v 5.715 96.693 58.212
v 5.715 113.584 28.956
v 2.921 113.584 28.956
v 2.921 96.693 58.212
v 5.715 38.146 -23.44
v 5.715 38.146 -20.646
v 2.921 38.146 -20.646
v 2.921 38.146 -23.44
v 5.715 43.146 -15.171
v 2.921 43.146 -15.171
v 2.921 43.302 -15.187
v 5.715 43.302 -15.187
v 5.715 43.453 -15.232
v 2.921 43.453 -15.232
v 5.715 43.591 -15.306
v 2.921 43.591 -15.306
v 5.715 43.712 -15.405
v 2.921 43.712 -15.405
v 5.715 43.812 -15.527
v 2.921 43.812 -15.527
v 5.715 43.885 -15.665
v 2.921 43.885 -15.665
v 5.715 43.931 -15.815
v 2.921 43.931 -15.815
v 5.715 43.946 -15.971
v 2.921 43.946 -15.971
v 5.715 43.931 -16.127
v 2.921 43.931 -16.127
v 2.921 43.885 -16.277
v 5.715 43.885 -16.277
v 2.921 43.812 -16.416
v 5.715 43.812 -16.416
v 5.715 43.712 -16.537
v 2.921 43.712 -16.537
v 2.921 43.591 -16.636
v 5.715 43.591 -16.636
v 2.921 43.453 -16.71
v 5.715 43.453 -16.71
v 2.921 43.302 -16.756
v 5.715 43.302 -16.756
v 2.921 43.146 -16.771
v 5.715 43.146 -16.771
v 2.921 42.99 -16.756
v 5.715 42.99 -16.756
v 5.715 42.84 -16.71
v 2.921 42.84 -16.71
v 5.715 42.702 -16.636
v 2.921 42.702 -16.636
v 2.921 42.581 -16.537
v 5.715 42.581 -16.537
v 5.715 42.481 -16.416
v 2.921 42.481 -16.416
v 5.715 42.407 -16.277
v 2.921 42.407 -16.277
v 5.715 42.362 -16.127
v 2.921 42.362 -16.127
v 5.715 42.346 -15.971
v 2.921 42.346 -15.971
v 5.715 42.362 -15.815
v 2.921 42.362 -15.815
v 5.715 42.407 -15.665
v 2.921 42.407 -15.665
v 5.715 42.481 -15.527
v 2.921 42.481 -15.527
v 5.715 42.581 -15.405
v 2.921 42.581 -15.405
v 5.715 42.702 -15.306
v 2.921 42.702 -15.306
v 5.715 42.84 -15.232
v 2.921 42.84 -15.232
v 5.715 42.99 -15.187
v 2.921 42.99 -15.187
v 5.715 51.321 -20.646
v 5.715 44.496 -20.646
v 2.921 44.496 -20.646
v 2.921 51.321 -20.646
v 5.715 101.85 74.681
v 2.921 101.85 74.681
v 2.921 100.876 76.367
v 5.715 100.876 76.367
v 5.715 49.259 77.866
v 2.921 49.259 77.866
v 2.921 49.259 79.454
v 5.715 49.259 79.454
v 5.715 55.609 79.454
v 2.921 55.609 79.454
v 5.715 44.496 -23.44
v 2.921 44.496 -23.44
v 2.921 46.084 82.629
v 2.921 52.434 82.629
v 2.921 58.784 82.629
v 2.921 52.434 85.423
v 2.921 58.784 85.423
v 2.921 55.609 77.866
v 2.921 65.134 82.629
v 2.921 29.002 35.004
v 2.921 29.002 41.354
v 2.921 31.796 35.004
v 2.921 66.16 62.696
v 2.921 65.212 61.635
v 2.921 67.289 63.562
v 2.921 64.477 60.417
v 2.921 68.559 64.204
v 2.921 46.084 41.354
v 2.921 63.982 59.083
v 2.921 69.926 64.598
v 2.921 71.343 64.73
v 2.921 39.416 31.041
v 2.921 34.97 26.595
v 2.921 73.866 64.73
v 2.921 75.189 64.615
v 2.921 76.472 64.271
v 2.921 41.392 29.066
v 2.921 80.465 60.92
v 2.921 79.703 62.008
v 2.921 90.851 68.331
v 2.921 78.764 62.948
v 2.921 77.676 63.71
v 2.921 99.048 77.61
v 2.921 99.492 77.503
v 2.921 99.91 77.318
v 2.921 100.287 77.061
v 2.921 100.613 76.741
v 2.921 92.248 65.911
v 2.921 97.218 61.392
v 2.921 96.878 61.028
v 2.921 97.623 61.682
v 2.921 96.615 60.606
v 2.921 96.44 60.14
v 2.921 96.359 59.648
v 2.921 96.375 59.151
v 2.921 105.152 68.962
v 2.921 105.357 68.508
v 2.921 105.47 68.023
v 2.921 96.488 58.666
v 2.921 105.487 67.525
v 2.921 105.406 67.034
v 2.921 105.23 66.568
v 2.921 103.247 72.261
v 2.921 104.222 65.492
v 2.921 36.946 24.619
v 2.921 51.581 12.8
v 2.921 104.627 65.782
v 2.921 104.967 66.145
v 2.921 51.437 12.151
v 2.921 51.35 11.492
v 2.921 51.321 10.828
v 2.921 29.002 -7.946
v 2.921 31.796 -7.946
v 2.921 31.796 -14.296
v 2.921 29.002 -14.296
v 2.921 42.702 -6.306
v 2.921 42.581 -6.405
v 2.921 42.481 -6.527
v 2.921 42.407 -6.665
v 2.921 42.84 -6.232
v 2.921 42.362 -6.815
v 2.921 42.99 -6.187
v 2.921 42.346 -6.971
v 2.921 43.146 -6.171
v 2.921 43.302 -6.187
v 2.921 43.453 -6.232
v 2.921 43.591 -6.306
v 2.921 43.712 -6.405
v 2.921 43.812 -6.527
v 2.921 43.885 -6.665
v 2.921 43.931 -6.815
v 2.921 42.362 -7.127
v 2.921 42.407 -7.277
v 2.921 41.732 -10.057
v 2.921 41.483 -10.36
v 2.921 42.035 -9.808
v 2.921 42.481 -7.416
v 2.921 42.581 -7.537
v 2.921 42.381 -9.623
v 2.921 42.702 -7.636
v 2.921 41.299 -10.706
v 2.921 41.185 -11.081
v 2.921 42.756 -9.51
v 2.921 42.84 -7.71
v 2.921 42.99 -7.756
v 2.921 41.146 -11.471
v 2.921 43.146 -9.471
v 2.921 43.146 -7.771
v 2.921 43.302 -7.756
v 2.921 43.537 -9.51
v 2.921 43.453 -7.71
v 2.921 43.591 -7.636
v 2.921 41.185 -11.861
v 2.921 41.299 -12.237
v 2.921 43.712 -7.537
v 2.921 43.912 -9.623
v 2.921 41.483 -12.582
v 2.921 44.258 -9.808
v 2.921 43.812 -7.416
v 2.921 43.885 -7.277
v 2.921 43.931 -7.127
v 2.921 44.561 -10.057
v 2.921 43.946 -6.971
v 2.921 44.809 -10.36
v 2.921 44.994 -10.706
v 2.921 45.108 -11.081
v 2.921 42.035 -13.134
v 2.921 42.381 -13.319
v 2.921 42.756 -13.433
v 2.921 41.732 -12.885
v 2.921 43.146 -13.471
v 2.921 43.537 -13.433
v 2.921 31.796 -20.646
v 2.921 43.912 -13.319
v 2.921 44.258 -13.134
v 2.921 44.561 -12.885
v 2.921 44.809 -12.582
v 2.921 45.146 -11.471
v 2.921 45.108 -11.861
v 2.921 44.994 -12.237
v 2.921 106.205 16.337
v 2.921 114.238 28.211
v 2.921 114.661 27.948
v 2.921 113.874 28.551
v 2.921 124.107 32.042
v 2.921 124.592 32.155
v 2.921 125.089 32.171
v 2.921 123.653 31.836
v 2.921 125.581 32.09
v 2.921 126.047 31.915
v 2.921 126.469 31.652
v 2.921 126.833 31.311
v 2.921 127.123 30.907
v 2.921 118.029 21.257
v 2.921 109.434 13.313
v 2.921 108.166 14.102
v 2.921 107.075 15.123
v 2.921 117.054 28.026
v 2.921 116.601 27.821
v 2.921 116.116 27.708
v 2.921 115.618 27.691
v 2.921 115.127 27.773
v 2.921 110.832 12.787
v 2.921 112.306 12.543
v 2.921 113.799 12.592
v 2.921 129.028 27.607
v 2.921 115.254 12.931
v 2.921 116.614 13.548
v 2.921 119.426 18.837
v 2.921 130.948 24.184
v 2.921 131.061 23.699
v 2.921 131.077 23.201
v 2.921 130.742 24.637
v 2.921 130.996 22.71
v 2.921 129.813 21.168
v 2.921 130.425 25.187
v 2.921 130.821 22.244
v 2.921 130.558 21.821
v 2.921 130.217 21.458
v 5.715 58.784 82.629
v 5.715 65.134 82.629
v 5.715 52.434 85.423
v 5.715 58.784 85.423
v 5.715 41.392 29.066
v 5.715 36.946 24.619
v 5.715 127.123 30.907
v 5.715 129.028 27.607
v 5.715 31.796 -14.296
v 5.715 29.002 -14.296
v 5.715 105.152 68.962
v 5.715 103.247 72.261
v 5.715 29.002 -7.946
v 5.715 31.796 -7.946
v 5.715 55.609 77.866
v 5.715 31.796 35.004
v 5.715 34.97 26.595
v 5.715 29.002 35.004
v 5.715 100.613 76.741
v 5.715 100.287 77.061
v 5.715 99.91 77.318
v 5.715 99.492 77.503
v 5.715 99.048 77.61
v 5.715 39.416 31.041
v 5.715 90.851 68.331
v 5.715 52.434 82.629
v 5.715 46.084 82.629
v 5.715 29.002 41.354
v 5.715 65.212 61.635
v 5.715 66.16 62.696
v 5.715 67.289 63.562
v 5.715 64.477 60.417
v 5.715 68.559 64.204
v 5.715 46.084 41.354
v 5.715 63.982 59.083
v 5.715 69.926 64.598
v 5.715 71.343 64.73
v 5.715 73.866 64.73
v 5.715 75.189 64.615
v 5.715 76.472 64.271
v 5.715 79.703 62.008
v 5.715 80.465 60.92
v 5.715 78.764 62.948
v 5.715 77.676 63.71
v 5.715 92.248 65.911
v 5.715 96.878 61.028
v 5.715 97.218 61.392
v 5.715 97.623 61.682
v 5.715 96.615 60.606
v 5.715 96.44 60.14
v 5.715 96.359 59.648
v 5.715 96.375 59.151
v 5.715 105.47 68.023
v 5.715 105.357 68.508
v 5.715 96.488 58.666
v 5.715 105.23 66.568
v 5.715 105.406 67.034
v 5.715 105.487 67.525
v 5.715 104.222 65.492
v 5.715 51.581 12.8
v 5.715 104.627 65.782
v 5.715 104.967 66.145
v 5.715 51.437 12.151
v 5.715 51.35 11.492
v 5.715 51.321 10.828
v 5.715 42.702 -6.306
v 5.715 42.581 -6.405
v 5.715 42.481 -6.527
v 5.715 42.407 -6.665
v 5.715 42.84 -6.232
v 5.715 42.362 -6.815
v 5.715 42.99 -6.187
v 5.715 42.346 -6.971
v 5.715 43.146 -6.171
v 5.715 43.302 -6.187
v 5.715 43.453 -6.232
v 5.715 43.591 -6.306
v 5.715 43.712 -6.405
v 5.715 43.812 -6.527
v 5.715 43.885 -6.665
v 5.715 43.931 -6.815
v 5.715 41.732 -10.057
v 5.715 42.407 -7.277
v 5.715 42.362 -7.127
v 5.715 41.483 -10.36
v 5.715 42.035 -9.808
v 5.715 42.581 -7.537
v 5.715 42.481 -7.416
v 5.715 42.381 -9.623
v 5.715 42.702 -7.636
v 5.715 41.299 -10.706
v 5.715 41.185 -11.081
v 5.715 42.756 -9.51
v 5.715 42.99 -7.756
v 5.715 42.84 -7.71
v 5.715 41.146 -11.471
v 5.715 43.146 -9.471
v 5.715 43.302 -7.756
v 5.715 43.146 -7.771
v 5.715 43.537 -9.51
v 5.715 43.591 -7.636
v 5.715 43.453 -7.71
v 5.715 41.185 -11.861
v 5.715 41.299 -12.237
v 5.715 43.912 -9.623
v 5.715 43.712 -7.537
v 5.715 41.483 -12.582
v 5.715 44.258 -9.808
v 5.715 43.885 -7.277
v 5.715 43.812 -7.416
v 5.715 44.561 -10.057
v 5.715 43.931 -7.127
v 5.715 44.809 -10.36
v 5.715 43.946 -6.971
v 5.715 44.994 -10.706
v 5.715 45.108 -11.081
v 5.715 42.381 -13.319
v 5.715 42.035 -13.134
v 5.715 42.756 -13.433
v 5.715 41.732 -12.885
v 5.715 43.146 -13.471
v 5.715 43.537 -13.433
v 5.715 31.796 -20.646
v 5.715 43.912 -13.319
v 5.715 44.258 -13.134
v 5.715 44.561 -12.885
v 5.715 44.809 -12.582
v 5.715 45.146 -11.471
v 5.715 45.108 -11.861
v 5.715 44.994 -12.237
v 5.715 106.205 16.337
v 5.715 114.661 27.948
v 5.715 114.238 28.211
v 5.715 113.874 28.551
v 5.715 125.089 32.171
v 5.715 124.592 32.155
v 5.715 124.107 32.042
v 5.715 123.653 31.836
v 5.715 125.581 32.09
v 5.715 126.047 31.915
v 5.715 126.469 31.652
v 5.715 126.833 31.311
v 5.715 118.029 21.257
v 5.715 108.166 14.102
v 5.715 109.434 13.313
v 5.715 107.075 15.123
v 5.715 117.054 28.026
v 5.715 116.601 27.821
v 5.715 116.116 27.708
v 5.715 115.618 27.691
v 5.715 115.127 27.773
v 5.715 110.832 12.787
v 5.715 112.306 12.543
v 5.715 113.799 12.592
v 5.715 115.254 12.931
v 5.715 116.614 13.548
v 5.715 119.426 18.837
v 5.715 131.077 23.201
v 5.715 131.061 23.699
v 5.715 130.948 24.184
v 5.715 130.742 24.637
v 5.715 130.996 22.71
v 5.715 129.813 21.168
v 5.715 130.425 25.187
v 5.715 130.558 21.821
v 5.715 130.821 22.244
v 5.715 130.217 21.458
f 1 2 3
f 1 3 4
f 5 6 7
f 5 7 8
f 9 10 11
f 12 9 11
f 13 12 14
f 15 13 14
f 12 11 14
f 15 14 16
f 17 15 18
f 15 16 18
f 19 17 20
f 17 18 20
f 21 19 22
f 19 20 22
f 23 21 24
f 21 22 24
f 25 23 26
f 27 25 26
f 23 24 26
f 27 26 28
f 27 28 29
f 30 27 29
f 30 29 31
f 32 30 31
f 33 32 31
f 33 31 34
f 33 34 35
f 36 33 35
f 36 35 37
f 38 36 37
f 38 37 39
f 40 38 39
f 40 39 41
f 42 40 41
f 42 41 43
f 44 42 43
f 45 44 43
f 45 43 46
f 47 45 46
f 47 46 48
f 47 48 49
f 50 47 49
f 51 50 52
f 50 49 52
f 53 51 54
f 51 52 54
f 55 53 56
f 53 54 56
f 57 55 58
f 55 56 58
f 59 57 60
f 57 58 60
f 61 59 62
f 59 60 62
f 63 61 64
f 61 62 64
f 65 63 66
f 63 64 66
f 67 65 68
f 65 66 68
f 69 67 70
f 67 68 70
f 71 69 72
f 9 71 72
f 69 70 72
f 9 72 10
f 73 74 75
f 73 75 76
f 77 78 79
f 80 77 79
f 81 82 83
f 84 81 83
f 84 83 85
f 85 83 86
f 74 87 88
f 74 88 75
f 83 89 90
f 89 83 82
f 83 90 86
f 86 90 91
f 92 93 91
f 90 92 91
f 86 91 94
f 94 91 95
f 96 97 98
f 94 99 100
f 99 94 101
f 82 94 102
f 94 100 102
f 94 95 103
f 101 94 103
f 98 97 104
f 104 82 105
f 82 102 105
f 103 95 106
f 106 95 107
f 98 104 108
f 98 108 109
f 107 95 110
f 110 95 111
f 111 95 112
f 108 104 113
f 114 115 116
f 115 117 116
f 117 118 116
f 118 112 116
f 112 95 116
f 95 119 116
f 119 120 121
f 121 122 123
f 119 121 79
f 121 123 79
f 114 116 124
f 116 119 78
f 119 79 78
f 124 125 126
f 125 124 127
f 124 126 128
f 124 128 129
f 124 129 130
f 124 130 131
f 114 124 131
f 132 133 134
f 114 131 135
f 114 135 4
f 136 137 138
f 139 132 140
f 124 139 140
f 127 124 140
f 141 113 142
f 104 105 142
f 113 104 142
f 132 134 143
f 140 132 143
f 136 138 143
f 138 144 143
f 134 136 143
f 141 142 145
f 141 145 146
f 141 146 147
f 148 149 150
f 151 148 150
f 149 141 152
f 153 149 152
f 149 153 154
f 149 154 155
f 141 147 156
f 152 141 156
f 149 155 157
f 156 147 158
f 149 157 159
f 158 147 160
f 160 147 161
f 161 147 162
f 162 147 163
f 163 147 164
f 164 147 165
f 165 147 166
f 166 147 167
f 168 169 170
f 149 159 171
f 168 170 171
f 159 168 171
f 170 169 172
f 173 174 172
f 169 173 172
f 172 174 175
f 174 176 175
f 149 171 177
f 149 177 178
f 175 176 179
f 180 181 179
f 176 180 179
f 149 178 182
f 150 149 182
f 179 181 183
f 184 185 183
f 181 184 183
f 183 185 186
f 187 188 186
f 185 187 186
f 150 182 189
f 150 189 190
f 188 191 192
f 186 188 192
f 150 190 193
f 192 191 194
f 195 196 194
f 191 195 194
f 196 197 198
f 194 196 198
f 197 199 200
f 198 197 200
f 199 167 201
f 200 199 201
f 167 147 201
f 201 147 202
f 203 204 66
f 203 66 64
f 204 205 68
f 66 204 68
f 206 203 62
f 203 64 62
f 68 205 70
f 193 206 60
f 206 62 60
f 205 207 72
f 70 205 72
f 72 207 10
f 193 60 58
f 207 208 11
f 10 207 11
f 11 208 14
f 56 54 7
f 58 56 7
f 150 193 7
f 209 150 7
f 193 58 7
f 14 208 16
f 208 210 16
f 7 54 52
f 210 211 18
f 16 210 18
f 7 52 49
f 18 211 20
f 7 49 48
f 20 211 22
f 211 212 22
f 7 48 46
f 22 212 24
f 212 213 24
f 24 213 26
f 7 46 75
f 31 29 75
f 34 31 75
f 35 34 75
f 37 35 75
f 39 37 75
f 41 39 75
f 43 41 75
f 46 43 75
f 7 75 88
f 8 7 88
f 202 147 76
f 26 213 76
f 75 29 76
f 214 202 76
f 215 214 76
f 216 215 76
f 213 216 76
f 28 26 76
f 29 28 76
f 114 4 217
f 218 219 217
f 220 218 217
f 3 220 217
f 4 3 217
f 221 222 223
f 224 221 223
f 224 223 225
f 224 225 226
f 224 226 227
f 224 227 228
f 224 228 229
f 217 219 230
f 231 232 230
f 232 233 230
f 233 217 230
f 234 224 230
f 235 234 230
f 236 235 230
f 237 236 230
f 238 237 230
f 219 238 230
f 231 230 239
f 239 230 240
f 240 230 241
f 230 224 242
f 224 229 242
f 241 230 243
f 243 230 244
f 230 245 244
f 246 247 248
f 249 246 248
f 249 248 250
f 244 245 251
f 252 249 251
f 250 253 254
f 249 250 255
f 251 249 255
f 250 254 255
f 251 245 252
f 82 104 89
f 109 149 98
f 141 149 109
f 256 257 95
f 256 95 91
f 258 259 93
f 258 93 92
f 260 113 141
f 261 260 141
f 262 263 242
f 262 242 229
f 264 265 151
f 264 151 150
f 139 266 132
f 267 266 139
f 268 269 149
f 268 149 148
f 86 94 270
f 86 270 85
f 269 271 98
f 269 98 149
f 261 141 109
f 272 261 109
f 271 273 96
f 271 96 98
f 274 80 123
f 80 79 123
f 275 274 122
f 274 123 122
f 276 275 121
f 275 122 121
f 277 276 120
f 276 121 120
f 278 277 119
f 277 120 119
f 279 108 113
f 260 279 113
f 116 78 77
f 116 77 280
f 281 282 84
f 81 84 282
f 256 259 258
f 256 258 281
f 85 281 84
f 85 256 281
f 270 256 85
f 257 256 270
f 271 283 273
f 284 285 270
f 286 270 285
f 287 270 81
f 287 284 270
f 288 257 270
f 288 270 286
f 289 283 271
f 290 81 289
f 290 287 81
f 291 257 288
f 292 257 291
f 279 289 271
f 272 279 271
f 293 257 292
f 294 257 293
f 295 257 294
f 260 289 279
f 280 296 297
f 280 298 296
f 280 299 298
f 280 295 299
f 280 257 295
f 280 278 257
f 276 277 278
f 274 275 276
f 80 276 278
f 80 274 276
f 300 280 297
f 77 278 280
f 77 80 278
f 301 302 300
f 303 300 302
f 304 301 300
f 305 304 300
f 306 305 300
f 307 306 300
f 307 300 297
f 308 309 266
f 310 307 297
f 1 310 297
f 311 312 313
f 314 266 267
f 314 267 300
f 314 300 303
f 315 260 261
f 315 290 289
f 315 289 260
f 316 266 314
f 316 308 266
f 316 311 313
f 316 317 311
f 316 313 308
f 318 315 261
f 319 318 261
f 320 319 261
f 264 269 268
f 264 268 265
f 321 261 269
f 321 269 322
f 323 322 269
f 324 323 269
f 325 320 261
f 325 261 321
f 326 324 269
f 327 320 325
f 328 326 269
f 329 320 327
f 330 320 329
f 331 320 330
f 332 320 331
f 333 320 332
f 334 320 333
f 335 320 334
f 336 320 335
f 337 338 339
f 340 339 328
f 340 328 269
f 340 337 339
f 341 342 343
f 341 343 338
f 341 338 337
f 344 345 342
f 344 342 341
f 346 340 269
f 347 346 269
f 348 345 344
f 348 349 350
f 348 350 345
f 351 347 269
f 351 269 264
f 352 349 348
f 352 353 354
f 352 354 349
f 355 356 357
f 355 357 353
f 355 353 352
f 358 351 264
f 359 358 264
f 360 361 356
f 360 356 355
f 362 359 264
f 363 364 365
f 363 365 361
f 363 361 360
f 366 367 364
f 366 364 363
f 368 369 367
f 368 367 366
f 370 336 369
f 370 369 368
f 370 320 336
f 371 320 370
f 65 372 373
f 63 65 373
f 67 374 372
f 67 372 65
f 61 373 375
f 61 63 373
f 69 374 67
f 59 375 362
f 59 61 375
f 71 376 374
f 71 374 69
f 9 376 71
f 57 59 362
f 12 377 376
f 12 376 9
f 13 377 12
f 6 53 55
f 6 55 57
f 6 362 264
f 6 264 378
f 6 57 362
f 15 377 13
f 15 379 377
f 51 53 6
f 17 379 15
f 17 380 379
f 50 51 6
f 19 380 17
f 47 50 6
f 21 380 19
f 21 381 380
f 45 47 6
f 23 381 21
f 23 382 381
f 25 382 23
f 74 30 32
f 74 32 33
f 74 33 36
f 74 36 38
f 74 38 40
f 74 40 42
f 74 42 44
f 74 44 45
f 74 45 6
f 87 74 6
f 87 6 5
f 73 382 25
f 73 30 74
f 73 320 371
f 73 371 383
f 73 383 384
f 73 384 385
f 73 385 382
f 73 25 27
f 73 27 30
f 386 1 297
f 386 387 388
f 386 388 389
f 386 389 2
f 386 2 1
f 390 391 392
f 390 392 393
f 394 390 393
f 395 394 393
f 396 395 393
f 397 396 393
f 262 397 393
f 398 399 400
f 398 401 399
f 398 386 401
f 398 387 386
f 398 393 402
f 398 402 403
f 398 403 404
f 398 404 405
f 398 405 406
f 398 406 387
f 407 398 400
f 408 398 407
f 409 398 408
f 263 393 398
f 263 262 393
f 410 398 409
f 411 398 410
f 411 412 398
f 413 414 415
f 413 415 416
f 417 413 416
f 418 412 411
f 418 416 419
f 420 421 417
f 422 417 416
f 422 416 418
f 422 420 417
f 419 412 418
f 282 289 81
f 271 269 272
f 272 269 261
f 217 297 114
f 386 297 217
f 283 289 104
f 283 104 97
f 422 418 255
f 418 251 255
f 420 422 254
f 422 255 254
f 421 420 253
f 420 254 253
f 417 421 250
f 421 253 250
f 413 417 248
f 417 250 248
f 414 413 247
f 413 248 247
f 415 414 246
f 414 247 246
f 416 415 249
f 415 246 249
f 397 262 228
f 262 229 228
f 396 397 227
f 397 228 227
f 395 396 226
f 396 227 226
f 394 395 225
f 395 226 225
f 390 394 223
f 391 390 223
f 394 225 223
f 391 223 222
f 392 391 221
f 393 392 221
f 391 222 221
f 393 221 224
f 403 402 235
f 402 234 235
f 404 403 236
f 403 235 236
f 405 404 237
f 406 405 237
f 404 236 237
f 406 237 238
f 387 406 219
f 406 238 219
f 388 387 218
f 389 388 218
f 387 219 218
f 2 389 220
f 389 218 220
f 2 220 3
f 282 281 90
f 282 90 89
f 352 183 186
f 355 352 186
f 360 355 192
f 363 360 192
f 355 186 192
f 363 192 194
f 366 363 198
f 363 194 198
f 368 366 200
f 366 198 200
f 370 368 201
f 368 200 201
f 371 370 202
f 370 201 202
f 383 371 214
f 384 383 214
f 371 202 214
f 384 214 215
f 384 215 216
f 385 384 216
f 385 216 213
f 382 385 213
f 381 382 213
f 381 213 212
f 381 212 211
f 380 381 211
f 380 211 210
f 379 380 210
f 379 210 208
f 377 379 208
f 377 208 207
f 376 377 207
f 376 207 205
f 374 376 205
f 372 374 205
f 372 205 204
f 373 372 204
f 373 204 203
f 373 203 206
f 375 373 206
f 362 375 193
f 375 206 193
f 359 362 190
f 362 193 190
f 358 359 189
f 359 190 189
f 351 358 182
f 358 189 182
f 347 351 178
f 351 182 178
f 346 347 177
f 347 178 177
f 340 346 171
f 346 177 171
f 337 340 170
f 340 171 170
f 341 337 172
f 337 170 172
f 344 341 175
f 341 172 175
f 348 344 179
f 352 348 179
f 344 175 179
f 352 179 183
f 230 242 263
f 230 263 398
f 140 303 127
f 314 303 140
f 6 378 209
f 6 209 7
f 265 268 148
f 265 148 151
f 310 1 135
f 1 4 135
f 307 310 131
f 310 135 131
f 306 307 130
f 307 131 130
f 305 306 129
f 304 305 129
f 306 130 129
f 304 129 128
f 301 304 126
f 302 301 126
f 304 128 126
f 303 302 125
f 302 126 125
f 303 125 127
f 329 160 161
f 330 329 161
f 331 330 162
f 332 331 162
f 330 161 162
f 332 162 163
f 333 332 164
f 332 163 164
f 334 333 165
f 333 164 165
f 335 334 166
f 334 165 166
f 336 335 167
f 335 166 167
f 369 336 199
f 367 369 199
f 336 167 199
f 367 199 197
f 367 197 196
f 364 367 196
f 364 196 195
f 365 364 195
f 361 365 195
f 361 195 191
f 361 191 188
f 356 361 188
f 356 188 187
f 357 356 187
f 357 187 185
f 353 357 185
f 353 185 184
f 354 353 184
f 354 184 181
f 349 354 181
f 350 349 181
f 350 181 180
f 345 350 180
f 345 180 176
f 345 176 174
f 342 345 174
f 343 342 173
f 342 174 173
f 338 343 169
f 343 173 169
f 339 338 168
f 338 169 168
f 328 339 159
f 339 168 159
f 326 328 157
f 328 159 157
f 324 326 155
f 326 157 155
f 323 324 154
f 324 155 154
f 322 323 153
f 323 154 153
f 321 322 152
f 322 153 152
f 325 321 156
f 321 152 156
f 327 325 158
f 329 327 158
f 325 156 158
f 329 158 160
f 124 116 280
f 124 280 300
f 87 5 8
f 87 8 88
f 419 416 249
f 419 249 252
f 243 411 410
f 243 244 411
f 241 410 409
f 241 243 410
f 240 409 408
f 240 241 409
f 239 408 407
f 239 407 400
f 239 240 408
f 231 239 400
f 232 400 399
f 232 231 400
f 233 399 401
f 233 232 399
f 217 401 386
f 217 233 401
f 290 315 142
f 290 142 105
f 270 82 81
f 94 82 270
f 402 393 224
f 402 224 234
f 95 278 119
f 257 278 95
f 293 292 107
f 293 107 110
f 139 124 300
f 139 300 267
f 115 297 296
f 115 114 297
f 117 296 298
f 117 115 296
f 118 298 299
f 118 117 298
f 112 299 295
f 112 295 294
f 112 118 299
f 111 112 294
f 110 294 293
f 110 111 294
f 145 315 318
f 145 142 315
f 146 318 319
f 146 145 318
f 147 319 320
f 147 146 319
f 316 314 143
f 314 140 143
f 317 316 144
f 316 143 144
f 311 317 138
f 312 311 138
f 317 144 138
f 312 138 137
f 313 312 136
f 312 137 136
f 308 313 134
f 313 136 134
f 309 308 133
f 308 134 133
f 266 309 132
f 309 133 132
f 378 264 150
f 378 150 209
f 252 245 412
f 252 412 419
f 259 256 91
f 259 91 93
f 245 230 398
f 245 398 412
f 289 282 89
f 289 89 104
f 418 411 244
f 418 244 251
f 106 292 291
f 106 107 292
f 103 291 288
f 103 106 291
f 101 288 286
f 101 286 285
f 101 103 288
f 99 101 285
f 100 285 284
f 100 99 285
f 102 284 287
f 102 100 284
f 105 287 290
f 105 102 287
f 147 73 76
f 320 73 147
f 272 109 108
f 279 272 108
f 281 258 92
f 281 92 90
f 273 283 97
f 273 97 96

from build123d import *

# Parameters (mm, degrees)
BOSS_EXTRUDE1_DEPTH = 2.794
SKETCH2_W           = 1.5875
SKETCH2_H           = 6.35
CUT_EXTRUDE1_DEPTH  = 158.264546986
FILLET2_R           = 2.54
FILLET3_R           = 7.62
SKETCH4_R           = 2
SKETCH4_R_2         = 0.8
CUT_EXTRUDE2_DEPTH  = 157.484941985
CUT_EXTRUDE3_DEPTH  = 157.484941985
CUT_EXTRUDE4_DEPTH  = 157.484941985


with BuildPart() as part:
    # Sketch1 → Boss-Extrude1 (new body)
    with BuildSketch(Plane.ZY.offset(-5.715)):
        Polygon((-20.646158347, 31.796360983), (-20.646158347, 38.146360983), (-23.440158347, 38.146360983), (-23.440158347, 44.496360983), (-20.646158347, 44.496360983), (-20.646158347, 51.321360983), (11.831425782, 51.321360983), (64.730392893, 65.495596501), (64.730392893, 78.265338355), (9.737779753, 110.015338355), (22.437779753, 132.012383611), (33.106346702, 125.852883611), (26.756346702, 114.854360983), (60.411825944, 95.423360983), (66.761825944, 106.421883611), (77.430392893, 100.262383611), (82.628841653, 65.133860983), (82.628841653, 58.783860983), (85.422841653, 58.783860983), (85.422841653, 52.433860983), (82.628841653, 52.433860983), (82.628841653, 46.083860983), (41.353841653, 46.083860983), (41.353841653, 29.002360983), (35.003841653, 29.002360983), (35.003841653, 31.796360983), (-7.946158347, 31.796360983), (-7.946158347, 29.002360983), (-14.296158347, 29.002360983), (-14.296158347, 31.796360983), align=None)
    extrude(amount=BOSS_EXTRUDE1_DEPTH)

    # Sketch2 → Cut-Extrude1 (cut, through all)
    with BuildSketch(Plane.ZY.offset(-2.921)):
        with Locations((78.660091653, 52.433860983)):
            Rectangle(SKETCH2_W, SKETCH2_H)
    extrude(amount=-CUT_EXTRUDE1_DEPTH, mode=Mode.SUBTRACT)

    # Fillet2
    fillet2_edges = [part.edges().sort_by_distance(p)[0] for p in [
        (4.318, 132.012383611, 22.437779753),
        (4.318, 125.852883611, 33.106346702),
        (4.318, 114.854360983, 26.756346702),
        (4.318, 95.423360983, 60.411825944),
        (4.318, 106.421883611, 66.761825944),
        (4.318, 100.262383611, 77.430392893),
    ]]
    fillet(fillet2_edges, radius=FILLET2_R)

    # Fillet3
    fillet3_edges = [part.edges().sort_by_distance(p)[0] for p in [
        (4.318, 51.321360983, 11.831425782),
        (4.318, 65.495596501, 64.730392893),
        (4.318, 78.265338355, 64.730392893),
        (4.318, 110.015338355, 9.737779753),
    ]]
    fillet(fillet3_edges, radius=FILLET3_R)

    # Sketch4 → Cut-Extrude2 (cut, through all)
    with BuildSketch(Plane.ZY.offset(-2.921)):
        with Locations((-11.471158347, 43.146360983)):
            Circle(SKETCH4_R)
        with Locations((-6.971158347, 43.146360983)):
            Circle(SKETCH4_R_2)
        with Locations((-15.971158347, 43.146360983)):
            Circle(SKETCH4_R_2)
    extrude(amount=-CUT_EXTRUDE2_DEPTH, mode=Mode.SUBTRACT)

    # Sketch5 → Cut-Extrude3 (cut, through all)
    with BuildSketch(Plane.ZY.offset(-2.921)):
        Polygon((29.065685306, 41.392017329), (24.619477371, 36.945809394), (26.595133717, 34.970153047), (31.041341653, 39.416360983), align=None)
    extrude(amount=-CUT_EXTRUDE3_DEPTH, mode=Mode.SUBTRACT)

    # Sketch7 → Cut-Extrude4 (cut, through all)
    with BuildSketch(Plane.ZY.offset(-2.921)):
        Polygon((27.607085388, 129.027883611), (21.257085388, 118.029360983), (18.83741041, 119.426360983), (25.18741041, 130.424883611), align=None)
        Polygon((74.680762236, 101.849883611), (68.330762236, 90.851360983), (65.911087258, 92.248360983), (72.261087258, 103.246883611), align=None)
    extrude(amount=-CUT_EXTRUDE4_DEPTH, mode=Mode.SUBTRACT)


solid = part.part
